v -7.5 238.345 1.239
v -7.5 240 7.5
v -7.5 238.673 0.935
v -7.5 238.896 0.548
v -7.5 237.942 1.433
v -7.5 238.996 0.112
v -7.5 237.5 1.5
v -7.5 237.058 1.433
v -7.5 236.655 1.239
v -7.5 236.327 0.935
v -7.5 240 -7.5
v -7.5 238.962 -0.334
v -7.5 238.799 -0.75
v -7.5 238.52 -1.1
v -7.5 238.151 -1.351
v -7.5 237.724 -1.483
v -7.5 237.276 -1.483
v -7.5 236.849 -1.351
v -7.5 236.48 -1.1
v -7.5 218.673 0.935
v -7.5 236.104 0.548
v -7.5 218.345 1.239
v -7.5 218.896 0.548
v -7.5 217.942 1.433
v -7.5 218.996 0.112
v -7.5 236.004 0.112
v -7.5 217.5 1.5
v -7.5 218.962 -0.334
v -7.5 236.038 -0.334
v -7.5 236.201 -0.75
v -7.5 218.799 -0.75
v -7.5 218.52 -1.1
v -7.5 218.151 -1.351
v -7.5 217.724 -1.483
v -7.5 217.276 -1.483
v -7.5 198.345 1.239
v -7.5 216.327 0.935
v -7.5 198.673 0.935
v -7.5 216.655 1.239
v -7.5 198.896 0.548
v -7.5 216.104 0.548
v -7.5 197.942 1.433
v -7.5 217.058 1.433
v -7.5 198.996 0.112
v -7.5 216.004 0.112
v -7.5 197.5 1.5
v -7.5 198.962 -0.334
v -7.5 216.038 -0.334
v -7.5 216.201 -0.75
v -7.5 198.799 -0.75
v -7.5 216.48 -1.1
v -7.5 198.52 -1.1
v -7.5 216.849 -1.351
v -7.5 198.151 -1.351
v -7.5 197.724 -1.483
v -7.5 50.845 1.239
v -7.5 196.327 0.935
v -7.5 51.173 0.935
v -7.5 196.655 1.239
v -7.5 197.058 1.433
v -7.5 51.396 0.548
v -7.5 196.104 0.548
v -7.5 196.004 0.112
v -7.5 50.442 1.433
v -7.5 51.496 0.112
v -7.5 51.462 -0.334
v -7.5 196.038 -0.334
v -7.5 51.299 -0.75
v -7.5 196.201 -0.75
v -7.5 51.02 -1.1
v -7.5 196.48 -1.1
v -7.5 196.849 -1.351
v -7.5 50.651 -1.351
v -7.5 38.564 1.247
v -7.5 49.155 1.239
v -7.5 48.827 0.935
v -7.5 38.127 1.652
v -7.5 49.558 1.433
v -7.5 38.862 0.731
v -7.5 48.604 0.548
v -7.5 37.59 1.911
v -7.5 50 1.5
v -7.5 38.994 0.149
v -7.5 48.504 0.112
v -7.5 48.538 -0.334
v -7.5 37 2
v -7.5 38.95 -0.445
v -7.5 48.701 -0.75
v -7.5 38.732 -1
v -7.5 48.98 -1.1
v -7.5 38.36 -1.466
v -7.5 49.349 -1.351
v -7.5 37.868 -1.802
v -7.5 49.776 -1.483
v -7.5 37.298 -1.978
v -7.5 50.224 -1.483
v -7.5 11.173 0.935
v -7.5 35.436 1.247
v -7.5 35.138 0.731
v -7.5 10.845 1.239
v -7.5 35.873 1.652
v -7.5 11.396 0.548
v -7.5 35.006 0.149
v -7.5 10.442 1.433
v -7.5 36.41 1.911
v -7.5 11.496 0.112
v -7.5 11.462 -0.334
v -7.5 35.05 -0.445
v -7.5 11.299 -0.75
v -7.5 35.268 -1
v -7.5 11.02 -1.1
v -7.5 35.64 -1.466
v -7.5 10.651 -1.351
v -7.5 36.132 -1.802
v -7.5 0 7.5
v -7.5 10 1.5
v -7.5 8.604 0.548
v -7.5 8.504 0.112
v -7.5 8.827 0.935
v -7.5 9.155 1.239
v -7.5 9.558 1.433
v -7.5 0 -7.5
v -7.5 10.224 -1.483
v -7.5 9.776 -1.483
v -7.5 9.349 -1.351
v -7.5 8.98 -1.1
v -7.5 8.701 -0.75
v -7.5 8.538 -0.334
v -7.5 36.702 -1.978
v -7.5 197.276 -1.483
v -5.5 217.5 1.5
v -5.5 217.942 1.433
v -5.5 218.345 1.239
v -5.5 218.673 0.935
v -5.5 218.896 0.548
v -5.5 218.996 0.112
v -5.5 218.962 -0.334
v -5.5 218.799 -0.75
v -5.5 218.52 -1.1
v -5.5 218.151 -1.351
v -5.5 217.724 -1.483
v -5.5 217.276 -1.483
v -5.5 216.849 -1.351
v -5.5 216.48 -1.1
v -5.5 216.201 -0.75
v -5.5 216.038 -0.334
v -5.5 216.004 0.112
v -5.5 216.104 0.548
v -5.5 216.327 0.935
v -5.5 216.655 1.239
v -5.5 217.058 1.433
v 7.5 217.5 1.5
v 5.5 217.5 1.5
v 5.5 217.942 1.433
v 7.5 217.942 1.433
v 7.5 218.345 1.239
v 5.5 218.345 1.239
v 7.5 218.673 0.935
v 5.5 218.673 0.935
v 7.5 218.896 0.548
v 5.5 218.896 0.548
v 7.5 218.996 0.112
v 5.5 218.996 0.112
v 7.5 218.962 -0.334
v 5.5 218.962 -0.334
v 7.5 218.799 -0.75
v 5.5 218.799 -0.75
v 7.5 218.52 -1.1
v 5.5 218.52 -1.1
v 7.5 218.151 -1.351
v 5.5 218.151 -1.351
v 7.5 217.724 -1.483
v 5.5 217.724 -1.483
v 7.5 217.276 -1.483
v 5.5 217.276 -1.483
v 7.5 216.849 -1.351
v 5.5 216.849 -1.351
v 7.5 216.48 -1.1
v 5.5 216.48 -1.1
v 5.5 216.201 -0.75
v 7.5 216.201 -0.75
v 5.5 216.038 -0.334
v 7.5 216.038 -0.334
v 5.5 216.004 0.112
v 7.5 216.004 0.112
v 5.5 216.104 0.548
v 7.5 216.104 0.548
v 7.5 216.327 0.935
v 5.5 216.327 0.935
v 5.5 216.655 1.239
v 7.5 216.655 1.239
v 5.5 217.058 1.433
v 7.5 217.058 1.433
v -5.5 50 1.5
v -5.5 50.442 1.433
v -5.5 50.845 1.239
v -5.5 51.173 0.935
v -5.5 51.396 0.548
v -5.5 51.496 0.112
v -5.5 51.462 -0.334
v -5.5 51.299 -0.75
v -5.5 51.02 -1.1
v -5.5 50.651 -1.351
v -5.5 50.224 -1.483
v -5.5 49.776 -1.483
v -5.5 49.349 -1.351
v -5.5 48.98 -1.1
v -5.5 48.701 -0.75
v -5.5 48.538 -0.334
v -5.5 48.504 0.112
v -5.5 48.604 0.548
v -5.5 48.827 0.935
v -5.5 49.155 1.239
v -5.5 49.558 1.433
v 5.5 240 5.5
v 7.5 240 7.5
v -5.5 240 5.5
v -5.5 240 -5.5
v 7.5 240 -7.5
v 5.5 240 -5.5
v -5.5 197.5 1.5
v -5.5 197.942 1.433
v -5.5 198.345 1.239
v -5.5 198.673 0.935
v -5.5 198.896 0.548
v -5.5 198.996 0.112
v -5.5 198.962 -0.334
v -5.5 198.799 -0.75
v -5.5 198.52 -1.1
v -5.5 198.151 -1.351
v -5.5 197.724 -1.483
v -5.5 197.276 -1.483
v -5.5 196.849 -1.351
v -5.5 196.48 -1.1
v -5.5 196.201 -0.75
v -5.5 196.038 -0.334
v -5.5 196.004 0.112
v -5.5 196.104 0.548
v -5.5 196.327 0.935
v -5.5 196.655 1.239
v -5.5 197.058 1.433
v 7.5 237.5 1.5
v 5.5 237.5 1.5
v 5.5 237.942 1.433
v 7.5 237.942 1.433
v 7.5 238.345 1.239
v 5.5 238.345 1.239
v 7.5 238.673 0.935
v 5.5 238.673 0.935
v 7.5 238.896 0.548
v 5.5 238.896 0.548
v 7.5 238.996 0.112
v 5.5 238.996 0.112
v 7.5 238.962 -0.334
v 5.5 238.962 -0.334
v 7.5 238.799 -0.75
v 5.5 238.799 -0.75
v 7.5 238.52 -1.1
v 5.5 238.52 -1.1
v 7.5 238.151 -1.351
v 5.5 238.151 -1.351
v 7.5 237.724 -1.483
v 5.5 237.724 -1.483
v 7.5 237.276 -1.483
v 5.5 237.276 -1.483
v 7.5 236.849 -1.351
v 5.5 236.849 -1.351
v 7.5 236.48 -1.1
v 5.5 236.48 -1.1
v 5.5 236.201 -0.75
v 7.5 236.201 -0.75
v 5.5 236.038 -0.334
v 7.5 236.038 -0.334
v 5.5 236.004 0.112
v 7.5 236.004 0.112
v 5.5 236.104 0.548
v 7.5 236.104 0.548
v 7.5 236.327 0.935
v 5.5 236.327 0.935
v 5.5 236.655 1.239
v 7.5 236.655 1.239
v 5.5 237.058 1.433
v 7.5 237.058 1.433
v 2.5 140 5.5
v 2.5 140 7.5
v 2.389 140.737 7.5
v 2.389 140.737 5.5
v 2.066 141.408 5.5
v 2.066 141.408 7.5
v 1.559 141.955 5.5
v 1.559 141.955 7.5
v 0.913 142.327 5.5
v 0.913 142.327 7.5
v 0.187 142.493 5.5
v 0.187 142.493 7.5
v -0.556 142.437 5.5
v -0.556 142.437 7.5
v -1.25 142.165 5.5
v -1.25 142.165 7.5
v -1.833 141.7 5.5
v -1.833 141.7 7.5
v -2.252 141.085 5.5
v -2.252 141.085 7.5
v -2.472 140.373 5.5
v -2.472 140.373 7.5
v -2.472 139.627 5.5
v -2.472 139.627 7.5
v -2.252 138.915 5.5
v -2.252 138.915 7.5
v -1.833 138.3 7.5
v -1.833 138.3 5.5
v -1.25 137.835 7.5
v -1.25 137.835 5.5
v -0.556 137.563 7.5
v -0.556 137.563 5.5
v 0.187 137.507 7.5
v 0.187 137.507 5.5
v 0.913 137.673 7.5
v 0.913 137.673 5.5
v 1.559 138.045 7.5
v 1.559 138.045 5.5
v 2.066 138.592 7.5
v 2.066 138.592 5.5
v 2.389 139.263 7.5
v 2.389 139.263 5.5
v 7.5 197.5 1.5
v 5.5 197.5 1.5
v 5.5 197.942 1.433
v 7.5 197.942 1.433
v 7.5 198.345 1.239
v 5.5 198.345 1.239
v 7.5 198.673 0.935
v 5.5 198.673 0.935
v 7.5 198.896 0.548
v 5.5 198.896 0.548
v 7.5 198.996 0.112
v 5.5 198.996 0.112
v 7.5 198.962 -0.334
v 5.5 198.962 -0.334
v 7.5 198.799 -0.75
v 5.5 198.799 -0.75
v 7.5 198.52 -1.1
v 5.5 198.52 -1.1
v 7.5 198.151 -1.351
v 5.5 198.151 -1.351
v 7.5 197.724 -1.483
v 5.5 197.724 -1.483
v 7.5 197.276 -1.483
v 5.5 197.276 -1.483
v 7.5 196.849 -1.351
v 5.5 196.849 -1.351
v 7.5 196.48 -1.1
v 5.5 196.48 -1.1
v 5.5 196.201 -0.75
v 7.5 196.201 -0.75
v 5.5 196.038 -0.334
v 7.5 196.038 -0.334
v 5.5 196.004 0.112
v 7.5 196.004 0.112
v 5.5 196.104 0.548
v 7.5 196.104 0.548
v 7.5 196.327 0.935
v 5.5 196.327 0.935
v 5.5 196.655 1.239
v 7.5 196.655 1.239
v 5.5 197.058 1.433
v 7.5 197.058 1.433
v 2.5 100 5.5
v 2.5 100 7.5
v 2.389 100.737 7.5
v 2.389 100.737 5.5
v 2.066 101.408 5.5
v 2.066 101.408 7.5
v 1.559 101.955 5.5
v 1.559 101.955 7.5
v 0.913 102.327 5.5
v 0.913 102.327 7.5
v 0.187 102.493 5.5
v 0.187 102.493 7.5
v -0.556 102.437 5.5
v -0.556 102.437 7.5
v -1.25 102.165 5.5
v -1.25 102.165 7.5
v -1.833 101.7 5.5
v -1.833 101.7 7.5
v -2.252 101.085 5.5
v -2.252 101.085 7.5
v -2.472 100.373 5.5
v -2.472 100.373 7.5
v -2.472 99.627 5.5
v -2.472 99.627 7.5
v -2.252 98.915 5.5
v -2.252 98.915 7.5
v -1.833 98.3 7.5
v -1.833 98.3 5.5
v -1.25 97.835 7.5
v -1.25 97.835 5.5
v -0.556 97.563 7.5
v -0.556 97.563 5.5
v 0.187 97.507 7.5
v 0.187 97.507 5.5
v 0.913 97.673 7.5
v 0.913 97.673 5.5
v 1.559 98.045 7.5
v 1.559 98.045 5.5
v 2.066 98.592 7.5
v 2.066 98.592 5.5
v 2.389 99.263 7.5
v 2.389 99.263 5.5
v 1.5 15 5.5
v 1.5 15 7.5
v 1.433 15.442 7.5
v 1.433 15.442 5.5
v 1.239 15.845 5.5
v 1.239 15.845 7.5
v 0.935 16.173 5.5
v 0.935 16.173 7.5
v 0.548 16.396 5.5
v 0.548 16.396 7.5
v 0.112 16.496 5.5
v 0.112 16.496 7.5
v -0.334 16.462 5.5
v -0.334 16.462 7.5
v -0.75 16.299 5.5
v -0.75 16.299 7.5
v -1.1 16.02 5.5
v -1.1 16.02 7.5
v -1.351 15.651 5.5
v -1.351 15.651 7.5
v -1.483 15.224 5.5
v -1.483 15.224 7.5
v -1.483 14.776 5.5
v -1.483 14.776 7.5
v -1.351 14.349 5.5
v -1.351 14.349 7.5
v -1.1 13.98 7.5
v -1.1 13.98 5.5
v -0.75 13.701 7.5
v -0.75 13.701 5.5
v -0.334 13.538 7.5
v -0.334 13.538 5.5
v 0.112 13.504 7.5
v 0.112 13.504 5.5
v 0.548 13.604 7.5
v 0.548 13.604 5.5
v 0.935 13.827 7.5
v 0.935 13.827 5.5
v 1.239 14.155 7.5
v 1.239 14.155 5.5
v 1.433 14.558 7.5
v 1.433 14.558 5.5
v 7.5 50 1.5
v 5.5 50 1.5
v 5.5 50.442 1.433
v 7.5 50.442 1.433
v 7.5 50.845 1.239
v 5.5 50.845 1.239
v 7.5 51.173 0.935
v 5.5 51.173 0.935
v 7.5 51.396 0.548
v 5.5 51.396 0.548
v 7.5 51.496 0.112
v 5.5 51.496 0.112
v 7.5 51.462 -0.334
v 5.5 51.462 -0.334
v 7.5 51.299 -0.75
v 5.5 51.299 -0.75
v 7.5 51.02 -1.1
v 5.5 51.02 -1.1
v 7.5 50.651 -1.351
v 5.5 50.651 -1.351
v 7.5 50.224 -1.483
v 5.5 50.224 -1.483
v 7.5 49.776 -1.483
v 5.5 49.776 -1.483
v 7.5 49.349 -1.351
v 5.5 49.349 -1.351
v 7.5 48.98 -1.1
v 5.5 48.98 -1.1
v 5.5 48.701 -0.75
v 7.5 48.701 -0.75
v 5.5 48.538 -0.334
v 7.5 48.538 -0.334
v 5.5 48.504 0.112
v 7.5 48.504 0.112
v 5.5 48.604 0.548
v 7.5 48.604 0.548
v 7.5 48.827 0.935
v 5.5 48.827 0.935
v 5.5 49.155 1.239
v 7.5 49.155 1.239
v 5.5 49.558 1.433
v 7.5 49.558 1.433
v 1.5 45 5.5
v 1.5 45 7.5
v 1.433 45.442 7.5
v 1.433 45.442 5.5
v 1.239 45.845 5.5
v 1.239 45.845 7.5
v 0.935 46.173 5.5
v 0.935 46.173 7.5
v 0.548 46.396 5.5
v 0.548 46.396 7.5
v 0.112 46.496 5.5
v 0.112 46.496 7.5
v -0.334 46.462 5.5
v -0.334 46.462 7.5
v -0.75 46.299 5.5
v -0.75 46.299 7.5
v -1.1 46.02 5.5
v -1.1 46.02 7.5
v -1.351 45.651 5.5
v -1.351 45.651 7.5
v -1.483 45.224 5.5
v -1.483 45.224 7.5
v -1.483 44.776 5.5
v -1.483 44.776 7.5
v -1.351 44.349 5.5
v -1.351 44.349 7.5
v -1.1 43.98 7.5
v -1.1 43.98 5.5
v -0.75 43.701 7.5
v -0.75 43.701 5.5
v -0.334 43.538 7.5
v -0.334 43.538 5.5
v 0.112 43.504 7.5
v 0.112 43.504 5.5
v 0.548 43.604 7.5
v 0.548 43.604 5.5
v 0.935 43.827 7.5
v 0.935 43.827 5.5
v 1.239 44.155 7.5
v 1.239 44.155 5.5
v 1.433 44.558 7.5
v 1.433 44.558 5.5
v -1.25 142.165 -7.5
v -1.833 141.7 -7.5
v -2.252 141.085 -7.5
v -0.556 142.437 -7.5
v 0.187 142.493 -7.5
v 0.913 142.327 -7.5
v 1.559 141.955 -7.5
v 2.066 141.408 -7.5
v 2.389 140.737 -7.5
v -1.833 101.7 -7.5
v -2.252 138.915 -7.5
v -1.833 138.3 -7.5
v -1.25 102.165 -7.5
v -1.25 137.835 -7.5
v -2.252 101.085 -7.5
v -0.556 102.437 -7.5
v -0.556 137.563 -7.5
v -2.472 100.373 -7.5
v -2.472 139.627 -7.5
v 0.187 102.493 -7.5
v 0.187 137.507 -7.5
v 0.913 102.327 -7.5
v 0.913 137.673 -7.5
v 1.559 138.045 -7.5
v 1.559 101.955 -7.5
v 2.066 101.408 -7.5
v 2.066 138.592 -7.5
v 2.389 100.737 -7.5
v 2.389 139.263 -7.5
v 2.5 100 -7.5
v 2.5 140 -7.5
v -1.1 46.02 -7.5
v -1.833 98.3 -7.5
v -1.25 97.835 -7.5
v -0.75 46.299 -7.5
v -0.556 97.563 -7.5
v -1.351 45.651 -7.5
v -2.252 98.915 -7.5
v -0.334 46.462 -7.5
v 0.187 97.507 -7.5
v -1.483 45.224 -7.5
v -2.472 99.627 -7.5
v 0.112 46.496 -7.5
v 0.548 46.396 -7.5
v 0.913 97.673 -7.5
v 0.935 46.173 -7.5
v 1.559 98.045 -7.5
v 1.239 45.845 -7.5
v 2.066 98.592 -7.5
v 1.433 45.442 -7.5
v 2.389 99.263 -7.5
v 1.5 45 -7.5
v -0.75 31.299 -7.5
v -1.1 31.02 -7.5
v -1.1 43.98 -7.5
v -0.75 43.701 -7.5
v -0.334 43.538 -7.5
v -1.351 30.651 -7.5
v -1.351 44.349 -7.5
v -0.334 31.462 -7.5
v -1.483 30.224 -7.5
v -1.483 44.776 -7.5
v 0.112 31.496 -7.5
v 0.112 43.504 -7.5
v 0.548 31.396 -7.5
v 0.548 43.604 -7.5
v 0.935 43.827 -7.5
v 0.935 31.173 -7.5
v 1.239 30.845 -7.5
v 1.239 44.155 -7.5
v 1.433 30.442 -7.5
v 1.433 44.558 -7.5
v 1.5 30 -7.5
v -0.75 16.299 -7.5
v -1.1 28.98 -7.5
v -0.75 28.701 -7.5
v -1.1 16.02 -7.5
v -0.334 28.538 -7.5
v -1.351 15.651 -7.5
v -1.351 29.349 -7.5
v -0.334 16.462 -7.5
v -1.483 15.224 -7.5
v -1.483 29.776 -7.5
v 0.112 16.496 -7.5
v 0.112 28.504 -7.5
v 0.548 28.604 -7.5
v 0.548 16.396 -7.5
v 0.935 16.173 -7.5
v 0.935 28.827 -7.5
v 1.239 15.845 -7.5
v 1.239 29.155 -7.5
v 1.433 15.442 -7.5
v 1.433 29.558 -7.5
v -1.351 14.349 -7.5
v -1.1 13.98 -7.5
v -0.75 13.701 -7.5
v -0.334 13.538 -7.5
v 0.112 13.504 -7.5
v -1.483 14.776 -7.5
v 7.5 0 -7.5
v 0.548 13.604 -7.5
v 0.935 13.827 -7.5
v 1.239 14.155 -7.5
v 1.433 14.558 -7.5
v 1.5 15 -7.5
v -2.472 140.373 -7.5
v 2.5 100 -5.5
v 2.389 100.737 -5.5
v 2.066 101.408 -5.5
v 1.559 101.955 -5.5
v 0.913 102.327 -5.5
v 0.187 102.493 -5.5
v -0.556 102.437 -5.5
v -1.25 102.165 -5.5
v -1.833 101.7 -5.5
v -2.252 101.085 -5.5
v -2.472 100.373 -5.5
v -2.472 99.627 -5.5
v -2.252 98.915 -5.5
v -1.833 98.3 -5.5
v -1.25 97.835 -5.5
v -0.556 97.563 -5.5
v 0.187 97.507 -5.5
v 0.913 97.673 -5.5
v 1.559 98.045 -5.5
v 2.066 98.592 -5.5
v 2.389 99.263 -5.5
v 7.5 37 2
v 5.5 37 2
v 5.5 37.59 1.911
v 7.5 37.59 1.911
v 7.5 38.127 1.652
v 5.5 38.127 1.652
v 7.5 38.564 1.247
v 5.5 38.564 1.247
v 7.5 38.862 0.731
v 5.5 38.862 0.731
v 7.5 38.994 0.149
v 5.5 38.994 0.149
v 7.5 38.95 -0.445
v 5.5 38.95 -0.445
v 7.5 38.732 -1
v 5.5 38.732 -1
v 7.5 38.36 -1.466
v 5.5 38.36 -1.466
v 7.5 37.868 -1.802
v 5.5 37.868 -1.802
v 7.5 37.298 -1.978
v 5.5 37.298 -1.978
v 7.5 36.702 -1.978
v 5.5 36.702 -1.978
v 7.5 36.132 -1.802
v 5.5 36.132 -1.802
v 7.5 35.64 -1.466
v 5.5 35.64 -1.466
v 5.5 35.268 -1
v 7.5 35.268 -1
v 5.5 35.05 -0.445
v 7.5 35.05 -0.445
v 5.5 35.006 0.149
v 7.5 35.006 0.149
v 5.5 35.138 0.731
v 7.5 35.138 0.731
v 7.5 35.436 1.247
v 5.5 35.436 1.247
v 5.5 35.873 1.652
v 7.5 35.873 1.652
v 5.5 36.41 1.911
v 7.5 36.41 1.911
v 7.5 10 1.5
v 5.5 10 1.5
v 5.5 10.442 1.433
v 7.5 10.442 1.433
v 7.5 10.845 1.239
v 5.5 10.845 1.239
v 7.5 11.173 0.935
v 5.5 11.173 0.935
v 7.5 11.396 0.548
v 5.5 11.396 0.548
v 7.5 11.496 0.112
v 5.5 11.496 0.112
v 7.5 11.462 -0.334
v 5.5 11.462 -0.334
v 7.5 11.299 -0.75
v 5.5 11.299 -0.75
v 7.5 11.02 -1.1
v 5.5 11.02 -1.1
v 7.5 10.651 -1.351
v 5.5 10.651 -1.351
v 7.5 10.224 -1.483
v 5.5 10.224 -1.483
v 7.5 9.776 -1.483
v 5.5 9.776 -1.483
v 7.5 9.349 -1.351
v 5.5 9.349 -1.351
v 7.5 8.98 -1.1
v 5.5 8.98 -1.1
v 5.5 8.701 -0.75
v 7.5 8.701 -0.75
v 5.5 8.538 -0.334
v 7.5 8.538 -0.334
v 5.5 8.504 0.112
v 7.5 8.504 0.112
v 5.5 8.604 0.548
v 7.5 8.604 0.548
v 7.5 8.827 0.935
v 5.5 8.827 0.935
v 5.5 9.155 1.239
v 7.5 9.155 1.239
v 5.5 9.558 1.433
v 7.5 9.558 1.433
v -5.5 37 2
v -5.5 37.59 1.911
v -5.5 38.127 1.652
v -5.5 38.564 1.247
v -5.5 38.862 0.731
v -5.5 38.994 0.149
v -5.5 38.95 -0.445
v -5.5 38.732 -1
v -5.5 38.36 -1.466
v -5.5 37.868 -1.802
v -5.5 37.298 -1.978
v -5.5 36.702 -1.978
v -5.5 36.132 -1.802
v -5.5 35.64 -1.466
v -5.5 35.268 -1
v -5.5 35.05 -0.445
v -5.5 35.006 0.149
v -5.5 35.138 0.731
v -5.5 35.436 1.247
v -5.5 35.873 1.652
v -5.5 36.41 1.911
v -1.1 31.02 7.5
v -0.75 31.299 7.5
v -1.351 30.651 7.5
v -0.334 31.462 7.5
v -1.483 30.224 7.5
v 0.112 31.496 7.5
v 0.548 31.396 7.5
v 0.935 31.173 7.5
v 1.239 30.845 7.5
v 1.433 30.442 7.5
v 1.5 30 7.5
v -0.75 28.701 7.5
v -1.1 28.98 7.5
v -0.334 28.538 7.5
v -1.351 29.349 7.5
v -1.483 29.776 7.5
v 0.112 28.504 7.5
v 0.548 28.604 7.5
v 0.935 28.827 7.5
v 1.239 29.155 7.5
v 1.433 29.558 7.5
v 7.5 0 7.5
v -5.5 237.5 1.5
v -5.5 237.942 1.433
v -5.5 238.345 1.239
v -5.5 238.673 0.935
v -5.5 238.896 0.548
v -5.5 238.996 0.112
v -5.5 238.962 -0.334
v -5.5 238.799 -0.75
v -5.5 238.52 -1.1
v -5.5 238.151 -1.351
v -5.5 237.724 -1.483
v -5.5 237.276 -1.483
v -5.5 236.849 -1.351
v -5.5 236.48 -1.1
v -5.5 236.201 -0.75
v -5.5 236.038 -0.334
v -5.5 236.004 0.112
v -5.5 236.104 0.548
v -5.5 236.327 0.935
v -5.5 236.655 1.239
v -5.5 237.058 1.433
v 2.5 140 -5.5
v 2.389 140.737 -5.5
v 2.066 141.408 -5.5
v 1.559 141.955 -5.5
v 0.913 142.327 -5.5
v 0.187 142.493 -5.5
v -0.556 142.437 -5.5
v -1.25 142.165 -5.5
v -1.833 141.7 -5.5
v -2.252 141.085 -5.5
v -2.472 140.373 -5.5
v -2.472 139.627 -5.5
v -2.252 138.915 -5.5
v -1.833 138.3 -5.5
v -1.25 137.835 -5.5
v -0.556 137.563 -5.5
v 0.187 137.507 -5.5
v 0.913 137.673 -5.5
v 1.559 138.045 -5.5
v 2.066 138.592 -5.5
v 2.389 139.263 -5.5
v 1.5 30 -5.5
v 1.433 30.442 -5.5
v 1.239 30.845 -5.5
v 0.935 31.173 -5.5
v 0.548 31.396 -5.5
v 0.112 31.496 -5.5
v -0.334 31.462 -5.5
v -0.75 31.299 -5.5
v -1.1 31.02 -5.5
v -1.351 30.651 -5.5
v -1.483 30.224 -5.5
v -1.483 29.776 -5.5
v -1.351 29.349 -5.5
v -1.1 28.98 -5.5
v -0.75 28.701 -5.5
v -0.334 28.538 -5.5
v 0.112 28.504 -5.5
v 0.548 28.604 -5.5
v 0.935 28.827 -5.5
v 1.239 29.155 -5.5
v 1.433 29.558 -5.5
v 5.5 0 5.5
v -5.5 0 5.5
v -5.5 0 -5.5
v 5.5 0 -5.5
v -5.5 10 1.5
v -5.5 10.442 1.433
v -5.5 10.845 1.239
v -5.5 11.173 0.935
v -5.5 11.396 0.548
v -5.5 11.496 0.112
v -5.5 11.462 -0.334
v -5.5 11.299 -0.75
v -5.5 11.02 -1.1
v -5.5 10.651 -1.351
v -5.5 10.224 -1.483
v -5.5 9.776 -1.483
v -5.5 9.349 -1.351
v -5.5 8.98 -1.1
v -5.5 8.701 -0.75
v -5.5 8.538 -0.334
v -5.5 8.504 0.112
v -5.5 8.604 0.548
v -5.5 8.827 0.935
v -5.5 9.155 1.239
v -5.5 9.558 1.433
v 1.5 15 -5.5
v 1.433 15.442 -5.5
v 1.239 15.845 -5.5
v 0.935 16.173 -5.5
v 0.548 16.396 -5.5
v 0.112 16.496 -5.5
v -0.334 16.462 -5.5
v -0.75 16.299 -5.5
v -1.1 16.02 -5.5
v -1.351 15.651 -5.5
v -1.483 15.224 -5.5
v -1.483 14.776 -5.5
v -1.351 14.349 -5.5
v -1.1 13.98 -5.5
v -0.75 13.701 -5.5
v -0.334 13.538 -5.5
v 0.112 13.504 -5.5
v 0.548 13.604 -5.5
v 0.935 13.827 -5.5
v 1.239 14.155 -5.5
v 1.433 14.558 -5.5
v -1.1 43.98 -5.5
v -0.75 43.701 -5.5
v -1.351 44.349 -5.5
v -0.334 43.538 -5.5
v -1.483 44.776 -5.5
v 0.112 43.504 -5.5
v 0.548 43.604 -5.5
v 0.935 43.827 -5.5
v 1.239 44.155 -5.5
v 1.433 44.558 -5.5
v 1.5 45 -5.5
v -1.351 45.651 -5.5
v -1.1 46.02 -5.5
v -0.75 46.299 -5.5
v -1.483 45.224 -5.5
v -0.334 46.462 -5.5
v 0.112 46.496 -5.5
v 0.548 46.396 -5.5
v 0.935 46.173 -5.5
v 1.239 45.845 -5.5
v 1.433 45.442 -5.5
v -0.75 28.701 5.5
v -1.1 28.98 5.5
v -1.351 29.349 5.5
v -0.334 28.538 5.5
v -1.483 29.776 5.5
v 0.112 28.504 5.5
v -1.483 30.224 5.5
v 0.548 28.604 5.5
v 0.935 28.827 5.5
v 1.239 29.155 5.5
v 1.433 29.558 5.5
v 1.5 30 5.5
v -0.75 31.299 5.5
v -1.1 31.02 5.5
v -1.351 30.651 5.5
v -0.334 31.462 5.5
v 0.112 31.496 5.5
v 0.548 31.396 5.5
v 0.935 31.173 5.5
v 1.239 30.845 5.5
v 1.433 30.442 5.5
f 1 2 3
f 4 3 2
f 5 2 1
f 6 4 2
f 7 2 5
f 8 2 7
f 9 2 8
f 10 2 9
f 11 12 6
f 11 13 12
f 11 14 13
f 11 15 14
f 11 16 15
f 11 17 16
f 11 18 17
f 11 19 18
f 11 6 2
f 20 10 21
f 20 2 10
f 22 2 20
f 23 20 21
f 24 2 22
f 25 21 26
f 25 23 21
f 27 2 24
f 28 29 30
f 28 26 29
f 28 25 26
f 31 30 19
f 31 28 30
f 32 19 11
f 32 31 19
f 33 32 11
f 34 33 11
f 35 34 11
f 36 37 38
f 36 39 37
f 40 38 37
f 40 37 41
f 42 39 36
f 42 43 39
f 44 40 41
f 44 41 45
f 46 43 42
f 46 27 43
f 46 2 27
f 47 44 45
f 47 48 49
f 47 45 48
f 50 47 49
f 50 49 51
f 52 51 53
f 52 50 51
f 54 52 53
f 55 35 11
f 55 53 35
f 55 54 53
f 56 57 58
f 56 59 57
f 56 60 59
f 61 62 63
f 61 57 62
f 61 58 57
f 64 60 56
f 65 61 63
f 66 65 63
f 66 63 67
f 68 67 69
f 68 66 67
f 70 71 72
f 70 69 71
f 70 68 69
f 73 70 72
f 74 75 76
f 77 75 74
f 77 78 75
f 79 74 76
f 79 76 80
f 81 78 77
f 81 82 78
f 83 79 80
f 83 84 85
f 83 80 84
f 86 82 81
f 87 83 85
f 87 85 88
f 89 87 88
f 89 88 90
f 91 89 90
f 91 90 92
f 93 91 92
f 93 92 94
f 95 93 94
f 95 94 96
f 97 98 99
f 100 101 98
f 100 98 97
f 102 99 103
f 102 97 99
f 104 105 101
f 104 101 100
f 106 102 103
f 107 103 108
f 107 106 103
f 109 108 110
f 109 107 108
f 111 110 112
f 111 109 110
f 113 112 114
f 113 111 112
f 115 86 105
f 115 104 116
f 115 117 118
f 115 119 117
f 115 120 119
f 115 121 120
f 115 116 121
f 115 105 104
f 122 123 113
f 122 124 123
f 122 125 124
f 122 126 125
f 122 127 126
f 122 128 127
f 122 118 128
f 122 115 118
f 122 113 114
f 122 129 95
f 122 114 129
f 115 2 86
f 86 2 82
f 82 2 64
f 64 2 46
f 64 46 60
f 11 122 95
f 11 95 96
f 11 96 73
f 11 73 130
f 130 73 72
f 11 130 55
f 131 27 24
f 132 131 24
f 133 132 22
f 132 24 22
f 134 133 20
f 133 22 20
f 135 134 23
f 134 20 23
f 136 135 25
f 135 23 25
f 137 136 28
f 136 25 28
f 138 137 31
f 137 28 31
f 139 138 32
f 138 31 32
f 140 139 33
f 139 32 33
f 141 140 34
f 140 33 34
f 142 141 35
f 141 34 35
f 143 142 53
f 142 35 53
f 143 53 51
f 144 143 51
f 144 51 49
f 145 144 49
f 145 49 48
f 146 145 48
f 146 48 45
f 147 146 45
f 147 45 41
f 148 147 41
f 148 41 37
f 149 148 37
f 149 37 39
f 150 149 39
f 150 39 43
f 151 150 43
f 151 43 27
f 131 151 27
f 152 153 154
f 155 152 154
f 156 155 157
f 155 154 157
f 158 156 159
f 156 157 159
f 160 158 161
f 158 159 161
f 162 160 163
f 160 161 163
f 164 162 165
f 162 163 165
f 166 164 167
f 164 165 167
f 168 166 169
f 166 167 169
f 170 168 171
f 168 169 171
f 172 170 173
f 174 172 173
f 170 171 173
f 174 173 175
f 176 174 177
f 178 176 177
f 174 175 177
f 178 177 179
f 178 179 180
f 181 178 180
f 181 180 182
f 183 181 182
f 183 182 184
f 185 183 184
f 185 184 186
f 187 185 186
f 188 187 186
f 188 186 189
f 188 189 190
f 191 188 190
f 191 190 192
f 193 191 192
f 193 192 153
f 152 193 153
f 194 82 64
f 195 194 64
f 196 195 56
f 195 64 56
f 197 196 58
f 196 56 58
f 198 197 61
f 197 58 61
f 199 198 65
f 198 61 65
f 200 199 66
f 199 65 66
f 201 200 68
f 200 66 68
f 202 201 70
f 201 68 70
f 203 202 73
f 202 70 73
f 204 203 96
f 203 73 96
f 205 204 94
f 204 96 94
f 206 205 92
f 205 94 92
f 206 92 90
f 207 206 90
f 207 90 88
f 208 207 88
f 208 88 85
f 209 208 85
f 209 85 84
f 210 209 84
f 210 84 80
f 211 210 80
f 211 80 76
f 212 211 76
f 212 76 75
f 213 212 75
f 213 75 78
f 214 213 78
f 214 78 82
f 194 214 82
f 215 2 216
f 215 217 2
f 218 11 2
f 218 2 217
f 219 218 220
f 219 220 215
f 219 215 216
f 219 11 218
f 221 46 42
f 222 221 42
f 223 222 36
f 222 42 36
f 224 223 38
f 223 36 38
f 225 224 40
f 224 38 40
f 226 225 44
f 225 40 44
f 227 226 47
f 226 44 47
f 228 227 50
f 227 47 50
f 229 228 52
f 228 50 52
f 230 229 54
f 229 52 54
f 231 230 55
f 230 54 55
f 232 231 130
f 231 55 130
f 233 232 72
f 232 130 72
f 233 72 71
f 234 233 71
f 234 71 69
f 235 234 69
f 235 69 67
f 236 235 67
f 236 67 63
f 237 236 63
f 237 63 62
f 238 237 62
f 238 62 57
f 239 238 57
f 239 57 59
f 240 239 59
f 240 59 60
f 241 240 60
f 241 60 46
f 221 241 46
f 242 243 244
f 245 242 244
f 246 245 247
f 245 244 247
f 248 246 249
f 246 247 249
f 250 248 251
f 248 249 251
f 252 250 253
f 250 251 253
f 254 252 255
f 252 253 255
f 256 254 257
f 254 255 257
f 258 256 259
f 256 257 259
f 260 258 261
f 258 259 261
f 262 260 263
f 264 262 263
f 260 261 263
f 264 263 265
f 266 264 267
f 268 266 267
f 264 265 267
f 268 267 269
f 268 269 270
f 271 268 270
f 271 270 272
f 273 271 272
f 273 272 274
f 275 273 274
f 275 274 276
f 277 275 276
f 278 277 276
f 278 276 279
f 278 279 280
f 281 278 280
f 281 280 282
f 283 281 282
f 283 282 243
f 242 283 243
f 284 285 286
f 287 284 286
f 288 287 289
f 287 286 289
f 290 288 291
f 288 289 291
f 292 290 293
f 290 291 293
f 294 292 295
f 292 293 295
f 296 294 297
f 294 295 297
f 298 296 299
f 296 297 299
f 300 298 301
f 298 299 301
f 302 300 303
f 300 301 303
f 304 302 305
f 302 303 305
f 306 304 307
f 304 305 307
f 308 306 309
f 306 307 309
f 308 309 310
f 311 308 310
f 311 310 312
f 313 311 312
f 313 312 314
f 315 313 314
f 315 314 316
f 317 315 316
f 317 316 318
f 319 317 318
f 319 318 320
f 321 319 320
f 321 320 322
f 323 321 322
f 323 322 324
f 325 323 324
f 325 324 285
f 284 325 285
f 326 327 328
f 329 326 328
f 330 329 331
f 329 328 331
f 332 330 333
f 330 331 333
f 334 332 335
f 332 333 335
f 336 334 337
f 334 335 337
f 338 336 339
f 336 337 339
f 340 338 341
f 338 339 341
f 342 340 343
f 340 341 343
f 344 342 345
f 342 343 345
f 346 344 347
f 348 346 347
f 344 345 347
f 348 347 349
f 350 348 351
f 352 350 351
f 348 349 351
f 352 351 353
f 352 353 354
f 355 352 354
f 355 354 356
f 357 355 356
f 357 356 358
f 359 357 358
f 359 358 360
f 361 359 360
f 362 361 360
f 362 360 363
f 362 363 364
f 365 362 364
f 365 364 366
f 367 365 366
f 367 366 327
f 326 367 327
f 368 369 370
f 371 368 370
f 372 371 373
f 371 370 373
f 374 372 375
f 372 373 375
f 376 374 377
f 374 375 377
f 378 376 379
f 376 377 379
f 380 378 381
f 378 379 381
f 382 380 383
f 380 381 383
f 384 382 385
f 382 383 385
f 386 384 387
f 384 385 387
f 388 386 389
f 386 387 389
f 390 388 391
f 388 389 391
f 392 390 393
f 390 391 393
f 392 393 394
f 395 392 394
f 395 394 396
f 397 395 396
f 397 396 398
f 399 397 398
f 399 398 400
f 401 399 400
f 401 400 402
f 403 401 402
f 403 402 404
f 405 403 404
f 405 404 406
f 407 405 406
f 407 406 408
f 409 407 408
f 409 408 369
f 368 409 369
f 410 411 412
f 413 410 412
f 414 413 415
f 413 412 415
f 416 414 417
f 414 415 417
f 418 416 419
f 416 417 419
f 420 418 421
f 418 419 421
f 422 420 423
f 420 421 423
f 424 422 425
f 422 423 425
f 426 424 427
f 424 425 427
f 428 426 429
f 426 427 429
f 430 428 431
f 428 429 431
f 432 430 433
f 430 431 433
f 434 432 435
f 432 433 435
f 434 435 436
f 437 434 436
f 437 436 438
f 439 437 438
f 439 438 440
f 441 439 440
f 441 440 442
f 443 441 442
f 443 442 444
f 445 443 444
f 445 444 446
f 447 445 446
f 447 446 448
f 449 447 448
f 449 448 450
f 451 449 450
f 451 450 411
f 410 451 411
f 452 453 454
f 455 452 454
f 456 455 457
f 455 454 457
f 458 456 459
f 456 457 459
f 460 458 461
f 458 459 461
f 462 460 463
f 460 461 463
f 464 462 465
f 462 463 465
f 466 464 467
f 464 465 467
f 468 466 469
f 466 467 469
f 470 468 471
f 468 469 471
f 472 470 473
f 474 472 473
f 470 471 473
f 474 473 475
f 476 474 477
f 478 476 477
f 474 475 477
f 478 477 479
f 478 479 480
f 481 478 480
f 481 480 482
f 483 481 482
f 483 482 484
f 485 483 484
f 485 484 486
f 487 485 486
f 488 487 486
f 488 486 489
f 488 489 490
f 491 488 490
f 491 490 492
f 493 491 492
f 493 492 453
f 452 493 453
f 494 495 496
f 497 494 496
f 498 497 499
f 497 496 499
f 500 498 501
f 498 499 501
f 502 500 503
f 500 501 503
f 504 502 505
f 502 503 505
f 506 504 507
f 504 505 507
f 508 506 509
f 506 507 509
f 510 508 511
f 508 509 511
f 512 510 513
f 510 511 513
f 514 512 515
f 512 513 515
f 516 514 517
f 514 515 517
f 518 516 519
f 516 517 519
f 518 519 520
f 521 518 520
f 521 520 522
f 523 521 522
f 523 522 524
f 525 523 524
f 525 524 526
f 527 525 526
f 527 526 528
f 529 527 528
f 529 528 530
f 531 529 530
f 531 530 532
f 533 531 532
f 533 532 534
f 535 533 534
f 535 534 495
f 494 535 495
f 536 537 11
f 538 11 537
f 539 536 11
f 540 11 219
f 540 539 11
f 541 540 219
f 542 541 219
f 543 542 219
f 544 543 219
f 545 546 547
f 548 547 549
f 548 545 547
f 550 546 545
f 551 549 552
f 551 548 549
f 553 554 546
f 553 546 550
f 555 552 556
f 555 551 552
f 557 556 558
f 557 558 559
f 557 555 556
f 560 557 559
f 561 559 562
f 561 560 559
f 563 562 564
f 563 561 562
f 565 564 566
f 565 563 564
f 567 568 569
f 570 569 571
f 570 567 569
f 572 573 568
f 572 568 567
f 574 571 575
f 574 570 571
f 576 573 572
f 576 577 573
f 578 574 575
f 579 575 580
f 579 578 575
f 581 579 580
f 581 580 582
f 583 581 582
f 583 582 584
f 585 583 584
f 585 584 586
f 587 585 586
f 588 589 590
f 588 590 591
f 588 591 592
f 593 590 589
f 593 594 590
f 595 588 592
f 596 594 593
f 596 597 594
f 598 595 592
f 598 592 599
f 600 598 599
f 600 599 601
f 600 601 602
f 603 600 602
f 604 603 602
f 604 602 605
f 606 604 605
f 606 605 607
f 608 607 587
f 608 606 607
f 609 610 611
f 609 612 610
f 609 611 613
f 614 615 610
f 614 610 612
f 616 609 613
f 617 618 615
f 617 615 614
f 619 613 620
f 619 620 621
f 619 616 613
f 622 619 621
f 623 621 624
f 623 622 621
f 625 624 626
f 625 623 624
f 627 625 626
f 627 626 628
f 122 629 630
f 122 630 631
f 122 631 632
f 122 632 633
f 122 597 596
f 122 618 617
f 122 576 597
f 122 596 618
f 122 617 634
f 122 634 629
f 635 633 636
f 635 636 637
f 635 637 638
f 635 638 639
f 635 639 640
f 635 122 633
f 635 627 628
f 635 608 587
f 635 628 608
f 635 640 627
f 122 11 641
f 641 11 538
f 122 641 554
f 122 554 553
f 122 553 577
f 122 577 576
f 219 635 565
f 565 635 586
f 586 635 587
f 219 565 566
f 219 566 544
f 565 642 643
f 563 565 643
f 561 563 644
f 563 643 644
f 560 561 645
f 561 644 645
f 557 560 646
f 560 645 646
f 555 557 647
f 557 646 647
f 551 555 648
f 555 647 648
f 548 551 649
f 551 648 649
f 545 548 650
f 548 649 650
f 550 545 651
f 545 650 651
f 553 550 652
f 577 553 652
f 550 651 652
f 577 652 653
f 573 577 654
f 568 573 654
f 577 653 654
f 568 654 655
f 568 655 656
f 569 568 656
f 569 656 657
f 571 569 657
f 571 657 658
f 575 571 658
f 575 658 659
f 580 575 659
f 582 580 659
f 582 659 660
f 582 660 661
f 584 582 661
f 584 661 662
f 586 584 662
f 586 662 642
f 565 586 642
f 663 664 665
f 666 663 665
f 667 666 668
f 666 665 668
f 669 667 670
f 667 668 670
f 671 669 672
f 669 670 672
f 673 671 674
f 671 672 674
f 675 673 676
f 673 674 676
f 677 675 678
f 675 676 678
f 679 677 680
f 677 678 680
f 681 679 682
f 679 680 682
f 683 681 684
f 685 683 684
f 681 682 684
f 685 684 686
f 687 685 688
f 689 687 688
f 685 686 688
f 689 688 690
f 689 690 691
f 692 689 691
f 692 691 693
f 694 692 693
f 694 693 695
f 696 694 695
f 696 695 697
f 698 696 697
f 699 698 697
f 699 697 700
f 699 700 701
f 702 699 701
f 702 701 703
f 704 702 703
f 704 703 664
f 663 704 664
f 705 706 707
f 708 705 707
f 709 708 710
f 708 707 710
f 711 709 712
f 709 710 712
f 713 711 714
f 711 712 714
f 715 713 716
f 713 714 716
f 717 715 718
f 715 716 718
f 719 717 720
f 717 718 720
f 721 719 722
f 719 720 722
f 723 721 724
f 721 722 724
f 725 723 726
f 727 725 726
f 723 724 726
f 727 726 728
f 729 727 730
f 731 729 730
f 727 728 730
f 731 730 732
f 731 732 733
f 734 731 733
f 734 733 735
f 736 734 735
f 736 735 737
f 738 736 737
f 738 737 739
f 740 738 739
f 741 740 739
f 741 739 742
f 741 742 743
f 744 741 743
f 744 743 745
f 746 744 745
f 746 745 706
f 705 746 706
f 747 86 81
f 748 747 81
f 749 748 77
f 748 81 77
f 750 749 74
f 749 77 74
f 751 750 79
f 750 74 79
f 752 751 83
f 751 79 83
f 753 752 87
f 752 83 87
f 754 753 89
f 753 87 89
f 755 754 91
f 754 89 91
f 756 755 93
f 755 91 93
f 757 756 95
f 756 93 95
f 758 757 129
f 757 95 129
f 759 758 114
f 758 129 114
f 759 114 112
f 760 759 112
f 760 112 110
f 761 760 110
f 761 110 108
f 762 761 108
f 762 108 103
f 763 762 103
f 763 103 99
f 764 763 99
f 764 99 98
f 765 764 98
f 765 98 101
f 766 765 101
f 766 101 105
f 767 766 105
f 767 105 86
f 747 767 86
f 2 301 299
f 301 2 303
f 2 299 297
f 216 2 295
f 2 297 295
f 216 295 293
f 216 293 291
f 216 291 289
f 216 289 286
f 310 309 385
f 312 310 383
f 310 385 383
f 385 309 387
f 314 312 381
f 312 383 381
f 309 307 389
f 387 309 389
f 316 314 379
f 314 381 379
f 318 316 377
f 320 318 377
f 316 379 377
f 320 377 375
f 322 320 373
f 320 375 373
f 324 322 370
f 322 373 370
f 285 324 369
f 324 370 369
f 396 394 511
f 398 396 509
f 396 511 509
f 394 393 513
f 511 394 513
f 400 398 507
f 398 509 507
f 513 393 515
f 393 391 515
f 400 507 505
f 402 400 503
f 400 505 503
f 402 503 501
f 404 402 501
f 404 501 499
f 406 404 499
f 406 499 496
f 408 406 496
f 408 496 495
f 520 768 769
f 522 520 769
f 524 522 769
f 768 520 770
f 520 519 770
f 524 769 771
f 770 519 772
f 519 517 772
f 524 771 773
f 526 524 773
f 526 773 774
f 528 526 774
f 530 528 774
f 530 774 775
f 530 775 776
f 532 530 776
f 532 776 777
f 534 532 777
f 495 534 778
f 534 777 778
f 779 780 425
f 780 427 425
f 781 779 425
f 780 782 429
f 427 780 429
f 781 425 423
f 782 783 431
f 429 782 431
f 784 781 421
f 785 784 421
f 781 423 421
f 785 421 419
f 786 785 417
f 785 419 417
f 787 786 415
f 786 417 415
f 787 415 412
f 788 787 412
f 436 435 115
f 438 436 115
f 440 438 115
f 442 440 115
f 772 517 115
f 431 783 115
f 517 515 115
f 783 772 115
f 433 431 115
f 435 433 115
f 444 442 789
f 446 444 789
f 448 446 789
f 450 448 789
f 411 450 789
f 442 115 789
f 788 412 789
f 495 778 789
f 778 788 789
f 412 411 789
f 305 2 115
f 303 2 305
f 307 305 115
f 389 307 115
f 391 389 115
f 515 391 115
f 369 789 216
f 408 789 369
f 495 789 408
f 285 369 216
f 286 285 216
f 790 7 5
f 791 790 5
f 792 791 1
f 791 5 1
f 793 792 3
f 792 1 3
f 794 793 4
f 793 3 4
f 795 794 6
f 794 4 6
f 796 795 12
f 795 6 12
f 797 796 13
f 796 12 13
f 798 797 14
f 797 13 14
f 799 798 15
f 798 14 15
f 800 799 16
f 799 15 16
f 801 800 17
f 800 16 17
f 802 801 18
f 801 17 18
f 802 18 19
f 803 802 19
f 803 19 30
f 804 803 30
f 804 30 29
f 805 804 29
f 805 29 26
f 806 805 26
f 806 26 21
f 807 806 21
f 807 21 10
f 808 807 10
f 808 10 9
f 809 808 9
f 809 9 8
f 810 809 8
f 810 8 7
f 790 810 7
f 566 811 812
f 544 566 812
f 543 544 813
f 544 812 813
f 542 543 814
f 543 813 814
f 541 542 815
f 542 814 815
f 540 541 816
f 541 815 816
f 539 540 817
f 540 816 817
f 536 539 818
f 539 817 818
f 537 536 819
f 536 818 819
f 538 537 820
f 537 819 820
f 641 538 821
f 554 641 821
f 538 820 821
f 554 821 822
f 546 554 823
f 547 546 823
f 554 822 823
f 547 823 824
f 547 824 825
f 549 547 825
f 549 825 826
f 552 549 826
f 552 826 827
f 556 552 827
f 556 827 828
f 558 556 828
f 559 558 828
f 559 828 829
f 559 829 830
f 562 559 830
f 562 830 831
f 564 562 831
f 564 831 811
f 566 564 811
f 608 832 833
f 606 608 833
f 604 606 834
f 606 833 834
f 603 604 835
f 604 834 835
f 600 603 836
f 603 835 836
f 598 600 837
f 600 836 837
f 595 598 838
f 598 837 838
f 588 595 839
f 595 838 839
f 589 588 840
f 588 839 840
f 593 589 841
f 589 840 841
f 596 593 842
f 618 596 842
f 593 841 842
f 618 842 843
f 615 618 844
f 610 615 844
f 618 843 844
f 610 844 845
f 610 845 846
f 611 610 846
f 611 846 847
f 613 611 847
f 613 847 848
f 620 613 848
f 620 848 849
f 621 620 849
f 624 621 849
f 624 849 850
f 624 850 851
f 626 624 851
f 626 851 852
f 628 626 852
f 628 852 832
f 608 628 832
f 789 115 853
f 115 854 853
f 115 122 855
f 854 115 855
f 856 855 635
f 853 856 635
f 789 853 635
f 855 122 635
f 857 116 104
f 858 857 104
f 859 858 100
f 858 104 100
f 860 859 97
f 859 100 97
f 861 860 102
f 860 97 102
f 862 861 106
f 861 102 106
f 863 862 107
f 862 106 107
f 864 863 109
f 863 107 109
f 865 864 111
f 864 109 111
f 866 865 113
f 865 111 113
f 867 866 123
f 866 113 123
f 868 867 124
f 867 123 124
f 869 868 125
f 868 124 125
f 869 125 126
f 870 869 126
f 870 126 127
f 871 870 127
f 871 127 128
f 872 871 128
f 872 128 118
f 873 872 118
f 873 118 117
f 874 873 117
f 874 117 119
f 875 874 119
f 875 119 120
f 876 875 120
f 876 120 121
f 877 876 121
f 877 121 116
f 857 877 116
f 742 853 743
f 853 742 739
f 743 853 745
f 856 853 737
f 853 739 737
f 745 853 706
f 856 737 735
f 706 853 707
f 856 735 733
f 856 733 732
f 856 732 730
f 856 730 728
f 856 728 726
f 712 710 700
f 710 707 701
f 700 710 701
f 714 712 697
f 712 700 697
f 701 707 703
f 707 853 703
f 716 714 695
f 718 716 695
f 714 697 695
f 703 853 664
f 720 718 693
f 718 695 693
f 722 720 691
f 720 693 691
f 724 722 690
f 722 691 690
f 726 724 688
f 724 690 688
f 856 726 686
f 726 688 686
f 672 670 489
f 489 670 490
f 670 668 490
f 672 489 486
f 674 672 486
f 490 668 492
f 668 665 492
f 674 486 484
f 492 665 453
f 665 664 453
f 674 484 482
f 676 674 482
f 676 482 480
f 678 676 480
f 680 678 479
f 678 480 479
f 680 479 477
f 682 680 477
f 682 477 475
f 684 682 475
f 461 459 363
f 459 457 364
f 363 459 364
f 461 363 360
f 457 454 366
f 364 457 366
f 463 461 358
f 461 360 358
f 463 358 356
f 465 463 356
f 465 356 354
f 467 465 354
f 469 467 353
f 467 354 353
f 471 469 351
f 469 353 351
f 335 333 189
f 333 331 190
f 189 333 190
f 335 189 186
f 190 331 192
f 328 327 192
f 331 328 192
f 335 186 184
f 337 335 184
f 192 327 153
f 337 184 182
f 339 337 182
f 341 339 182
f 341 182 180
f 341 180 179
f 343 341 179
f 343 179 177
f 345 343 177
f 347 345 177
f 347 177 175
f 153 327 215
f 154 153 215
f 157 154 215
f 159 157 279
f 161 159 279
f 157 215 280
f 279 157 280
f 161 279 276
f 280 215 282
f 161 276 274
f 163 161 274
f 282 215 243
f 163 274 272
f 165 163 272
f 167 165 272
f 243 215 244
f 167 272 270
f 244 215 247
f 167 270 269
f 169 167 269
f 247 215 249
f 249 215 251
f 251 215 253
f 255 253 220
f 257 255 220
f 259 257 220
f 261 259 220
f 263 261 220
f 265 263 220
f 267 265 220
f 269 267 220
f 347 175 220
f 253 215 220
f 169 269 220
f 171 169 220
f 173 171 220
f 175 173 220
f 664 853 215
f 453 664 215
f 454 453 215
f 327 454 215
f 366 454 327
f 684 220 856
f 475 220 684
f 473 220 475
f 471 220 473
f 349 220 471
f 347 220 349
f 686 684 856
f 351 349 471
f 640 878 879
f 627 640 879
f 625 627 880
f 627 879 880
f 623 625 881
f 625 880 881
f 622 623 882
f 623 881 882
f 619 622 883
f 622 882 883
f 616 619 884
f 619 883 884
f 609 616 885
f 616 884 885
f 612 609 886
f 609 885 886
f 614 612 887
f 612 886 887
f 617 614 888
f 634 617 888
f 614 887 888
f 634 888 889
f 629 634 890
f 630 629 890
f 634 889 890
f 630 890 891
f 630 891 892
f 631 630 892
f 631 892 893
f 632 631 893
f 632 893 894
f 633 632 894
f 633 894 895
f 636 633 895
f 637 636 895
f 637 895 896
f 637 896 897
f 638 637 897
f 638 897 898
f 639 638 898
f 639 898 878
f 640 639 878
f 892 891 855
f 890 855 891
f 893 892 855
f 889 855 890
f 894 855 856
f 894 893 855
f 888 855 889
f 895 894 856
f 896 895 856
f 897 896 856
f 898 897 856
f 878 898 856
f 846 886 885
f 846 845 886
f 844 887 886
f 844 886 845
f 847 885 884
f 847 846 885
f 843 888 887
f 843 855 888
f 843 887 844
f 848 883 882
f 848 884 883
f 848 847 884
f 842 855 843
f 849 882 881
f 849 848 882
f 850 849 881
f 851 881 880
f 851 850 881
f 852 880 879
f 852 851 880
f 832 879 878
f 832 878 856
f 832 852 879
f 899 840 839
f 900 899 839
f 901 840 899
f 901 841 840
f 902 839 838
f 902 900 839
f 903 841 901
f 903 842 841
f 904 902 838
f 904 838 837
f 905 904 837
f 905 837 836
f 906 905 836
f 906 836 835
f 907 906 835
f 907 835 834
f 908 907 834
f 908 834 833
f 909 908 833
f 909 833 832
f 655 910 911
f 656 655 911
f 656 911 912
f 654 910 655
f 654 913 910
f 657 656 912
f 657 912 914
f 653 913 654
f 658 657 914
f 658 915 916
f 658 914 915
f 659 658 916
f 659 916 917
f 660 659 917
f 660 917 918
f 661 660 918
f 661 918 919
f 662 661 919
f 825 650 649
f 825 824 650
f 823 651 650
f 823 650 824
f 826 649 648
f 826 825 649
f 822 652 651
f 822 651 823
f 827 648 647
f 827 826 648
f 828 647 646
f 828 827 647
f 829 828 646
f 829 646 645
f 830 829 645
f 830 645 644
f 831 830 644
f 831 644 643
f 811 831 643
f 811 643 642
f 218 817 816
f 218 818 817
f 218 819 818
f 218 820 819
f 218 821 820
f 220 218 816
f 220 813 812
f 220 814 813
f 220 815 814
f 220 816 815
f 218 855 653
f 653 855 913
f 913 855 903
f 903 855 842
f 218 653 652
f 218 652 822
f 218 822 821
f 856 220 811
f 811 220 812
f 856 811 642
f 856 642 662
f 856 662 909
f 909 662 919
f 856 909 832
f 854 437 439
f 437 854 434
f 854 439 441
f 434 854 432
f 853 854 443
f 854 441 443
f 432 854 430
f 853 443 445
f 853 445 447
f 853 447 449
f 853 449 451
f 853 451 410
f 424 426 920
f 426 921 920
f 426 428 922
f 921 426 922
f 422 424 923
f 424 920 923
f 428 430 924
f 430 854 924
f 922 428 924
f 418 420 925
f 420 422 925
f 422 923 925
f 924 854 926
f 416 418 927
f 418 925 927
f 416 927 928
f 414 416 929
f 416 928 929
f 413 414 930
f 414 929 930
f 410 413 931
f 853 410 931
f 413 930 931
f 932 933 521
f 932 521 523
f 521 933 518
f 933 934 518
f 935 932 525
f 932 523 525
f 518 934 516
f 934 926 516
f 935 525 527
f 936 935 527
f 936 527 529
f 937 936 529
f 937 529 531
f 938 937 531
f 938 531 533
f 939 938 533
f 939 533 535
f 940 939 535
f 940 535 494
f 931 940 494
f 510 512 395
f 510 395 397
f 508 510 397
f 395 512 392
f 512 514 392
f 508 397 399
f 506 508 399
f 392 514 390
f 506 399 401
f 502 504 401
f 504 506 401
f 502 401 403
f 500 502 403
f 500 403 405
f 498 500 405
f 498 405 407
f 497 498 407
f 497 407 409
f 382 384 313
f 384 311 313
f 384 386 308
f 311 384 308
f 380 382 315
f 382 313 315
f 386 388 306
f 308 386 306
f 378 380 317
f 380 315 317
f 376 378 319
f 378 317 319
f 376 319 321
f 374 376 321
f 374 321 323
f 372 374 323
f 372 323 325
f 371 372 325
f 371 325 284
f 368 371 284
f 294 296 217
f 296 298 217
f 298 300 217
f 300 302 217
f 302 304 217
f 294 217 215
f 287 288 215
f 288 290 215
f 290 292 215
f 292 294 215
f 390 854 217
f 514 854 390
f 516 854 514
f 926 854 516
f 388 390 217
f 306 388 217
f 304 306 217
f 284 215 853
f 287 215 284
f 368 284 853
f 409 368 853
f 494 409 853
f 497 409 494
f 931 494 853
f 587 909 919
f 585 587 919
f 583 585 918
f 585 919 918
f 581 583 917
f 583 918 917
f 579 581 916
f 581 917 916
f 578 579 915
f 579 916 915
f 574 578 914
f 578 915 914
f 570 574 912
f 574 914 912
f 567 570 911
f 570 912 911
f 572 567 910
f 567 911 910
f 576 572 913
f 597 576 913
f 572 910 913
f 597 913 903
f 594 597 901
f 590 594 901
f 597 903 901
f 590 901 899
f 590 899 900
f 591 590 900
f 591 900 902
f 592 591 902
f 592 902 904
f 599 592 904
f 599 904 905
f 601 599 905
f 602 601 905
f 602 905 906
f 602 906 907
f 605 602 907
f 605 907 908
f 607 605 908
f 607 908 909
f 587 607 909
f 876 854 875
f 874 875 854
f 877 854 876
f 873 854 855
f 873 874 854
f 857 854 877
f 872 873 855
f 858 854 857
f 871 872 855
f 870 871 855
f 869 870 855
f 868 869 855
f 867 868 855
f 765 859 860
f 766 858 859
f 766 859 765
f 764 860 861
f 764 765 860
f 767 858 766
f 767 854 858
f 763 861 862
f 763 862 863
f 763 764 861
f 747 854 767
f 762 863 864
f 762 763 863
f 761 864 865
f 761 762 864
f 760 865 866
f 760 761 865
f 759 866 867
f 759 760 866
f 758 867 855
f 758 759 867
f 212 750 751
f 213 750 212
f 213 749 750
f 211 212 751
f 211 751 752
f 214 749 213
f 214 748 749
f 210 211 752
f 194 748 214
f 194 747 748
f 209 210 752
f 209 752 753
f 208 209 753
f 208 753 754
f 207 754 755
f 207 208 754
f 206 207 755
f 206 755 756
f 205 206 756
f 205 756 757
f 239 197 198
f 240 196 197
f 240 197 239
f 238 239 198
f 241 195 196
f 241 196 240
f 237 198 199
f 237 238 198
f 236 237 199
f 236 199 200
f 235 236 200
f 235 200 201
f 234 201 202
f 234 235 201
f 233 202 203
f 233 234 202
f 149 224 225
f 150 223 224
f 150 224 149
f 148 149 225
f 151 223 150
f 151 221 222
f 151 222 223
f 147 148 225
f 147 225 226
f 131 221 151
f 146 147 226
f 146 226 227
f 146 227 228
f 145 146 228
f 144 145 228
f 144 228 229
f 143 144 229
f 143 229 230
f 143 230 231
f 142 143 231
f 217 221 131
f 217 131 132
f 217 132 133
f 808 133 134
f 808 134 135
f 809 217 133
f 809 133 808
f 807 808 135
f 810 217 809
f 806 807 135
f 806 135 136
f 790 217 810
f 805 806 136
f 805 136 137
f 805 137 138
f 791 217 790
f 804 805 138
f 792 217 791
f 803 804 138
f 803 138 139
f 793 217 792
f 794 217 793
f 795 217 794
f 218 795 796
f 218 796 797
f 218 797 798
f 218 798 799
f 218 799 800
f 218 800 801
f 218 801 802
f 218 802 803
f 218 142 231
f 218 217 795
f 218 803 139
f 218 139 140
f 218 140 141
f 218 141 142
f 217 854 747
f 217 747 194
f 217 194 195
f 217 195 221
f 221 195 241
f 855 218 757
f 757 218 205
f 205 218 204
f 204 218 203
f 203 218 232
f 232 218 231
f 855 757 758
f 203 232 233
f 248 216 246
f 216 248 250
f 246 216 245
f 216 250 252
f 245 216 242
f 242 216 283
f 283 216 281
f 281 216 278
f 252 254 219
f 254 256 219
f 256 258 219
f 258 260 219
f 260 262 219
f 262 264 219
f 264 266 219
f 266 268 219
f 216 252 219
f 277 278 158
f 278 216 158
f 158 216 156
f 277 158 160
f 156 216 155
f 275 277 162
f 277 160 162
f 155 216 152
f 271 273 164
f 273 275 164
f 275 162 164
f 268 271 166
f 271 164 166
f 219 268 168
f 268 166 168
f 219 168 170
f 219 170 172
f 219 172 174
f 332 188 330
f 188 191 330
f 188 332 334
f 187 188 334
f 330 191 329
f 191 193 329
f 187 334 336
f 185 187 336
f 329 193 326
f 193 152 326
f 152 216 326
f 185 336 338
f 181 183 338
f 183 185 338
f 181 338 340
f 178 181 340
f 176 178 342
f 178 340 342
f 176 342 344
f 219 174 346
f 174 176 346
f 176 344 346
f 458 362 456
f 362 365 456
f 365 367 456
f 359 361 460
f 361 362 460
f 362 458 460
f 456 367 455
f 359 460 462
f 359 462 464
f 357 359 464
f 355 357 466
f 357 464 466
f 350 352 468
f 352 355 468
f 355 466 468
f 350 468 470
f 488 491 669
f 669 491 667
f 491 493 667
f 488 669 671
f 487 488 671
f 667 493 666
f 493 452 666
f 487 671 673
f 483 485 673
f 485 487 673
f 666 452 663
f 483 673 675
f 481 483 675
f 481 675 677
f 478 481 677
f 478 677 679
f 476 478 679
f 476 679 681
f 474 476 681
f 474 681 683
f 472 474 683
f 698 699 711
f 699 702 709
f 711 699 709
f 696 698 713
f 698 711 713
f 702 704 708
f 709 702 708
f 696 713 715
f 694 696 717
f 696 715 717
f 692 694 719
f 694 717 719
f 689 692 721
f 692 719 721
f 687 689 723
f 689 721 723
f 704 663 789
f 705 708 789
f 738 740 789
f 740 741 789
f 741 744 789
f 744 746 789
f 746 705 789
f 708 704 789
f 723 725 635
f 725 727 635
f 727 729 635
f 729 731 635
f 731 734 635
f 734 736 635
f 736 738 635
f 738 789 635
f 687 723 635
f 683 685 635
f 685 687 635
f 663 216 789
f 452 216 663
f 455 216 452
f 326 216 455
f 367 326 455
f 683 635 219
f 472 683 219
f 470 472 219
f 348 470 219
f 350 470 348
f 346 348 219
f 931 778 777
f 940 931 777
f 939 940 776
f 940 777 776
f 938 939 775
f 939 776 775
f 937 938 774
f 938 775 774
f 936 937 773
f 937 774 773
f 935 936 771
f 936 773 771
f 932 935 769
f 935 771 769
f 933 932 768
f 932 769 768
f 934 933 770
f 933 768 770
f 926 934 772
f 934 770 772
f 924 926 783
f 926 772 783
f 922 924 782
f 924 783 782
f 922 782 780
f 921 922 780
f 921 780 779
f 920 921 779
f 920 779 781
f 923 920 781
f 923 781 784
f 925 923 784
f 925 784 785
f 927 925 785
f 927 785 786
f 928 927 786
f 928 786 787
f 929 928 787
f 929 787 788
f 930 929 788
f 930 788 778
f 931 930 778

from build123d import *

# Parameters (mm, degrees)
SKETCH_1_W          = 15
SKETCH_1_H          = 15
EXTRUDE_1_DEPTH     = 240
SKETCH_2_W          = 11
SKETCH_2_H          = 11
CUT_EXTRUDE_1_DEPTH = 240
SKETCH_3_R          = 2.5
CUT_EXTRUDE_2_DEPTH = 15
SKETCH_4_R          = 1.5
CUT_EXTRUDE_3_DEPTH = 15
SKETCH_5_R          = 1.5
SKETCH_5_R_2        = 2
CUT_EXTRUDE_4_DEPTH = 15


with BuildPart() as part:
    # 草图1 → 凸台-拉伸1 (new body)
    with BuildSketch(Plane(origin=(0, 0, 0), x_dir=(1, 0, 0), z_dir=(0, 1, 0))):
        Rectangle(SKETCH_1_W, SKETCH_1_H)
    extrude(amount=EXTRUDE_1_DEPTH)

    # 草图2 → 切除-拉伸1 (cut)
    with BuildSketch(Plane(origin=(0, 240, 0), x_dir=(1, 0, 0), z_dir=(0, 1, 0))):
        Rectangle(SKETCH_2_W, SKETCH_2_H)
    extrude(amount=-CUT_EXTRUDE_1_DEPTH, mode=Mode.SUBTRACT)

    # 草图3 → 切除-拉伸2 (cut)
    with BuildSketch(Plane.XY.offset(7.5)):
        with Locations((0, 140)):
            Circle(SKETCH_3_R)
        with Locations((0, 100)):
            Circle(SKETCH_3_R)
    extrude(amount=-CUT_EXTRUDE_2_DEPTH, mode=Mode.SUBTRACT)

    # 草图4 → 切除-拉伸3 (cut)
    with BuildSketch(Plane.XY.offset(7.5)):
        with Locations((0, 45)):
            Circle(SKETCH_4_R)
        with Locations((0, 30)):
            Circle(SKETCH_4_R)
        with Locations((0, 15)):
            Circle(SKETCH_4_R)
    extrude(amount=-CUT_EXTRUDE_3_DEPTH, mode=Mode.SUBTRACT)

    # 草图5 → 切除-拉伸4 (cut)
    with BuildSketch(Plane.ZY.offset(7.5)):
        with Locations((0, 10)):
            Circle(SKETCH_5_R)
        with Locations((0, 37)):
            Circle(SKETCH_5_R_2)
        with Locations((0, 50)):
            Circle(SKETCH_5_R)
        with Locations((0, 237.5)):
            Circle(SKETCH_5_R)
        with Locations((0, 217.5)):
            Circle(SKETCH_5_R)
        with Locations((0, 197.5)):
            Circle(SKETCH_5_R)
    extrude(amount=-CUT_EXTRUDE_4_DEPTH, mode=Mode.SUBTRACT)


solid = part.part
